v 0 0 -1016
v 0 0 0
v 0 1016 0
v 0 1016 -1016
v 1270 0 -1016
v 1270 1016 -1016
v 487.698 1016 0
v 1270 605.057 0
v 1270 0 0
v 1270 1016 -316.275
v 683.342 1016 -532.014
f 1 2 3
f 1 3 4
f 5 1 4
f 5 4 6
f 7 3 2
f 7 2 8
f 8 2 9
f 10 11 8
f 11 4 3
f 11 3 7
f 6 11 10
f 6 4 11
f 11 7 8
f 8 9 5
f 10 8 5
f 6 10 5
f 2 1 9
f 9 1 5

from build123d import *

# Parameters (mm, degrees)
SKETCH1_W           = 1270
SKETCH1_H           = 1016
BOSS_EXTRUDE1_DEPTH = 1016


with BuildPart() as part:
    # Sketch1 → Boss-Extrude1 (new body)
    with BuildSketch(Plane(origin=(0, 0, 0), x_dir=(1, 0, 0), z_dir=(0, 1, 0))):
        with Locations((635, 508)):
            Rectangle(SKETCH1_W, SKETCH1_H)
    extrude(amount=BOSS_EXTRUDE1_DEPTH)

    # Sketch2 → Cut-Loft3 section 0
    with BuildSketch(Plane(origin=(0, 1016, 0), x_dir=(1, 0, 0), z_dir=(0, 1, 0)), mode=Mode.PRIVATE) as cut_loft3_s0:
        with BuildLine():
            Line((487.697722316, 0), (683.341932375, 532.014117673))
            Line((683.341932375, 532.014117673), (1270, 316.275003987))
            Line((1270, 316.275003987), (1270, 0))
            Line((1270, 0), (487.697722316, 0))
        make_face()
    loft([cut_loft3_s0.sketch, Vertex(1270, 605.056510384, 0)], mode=Mode.SUBTRACT)


solid = part.part
